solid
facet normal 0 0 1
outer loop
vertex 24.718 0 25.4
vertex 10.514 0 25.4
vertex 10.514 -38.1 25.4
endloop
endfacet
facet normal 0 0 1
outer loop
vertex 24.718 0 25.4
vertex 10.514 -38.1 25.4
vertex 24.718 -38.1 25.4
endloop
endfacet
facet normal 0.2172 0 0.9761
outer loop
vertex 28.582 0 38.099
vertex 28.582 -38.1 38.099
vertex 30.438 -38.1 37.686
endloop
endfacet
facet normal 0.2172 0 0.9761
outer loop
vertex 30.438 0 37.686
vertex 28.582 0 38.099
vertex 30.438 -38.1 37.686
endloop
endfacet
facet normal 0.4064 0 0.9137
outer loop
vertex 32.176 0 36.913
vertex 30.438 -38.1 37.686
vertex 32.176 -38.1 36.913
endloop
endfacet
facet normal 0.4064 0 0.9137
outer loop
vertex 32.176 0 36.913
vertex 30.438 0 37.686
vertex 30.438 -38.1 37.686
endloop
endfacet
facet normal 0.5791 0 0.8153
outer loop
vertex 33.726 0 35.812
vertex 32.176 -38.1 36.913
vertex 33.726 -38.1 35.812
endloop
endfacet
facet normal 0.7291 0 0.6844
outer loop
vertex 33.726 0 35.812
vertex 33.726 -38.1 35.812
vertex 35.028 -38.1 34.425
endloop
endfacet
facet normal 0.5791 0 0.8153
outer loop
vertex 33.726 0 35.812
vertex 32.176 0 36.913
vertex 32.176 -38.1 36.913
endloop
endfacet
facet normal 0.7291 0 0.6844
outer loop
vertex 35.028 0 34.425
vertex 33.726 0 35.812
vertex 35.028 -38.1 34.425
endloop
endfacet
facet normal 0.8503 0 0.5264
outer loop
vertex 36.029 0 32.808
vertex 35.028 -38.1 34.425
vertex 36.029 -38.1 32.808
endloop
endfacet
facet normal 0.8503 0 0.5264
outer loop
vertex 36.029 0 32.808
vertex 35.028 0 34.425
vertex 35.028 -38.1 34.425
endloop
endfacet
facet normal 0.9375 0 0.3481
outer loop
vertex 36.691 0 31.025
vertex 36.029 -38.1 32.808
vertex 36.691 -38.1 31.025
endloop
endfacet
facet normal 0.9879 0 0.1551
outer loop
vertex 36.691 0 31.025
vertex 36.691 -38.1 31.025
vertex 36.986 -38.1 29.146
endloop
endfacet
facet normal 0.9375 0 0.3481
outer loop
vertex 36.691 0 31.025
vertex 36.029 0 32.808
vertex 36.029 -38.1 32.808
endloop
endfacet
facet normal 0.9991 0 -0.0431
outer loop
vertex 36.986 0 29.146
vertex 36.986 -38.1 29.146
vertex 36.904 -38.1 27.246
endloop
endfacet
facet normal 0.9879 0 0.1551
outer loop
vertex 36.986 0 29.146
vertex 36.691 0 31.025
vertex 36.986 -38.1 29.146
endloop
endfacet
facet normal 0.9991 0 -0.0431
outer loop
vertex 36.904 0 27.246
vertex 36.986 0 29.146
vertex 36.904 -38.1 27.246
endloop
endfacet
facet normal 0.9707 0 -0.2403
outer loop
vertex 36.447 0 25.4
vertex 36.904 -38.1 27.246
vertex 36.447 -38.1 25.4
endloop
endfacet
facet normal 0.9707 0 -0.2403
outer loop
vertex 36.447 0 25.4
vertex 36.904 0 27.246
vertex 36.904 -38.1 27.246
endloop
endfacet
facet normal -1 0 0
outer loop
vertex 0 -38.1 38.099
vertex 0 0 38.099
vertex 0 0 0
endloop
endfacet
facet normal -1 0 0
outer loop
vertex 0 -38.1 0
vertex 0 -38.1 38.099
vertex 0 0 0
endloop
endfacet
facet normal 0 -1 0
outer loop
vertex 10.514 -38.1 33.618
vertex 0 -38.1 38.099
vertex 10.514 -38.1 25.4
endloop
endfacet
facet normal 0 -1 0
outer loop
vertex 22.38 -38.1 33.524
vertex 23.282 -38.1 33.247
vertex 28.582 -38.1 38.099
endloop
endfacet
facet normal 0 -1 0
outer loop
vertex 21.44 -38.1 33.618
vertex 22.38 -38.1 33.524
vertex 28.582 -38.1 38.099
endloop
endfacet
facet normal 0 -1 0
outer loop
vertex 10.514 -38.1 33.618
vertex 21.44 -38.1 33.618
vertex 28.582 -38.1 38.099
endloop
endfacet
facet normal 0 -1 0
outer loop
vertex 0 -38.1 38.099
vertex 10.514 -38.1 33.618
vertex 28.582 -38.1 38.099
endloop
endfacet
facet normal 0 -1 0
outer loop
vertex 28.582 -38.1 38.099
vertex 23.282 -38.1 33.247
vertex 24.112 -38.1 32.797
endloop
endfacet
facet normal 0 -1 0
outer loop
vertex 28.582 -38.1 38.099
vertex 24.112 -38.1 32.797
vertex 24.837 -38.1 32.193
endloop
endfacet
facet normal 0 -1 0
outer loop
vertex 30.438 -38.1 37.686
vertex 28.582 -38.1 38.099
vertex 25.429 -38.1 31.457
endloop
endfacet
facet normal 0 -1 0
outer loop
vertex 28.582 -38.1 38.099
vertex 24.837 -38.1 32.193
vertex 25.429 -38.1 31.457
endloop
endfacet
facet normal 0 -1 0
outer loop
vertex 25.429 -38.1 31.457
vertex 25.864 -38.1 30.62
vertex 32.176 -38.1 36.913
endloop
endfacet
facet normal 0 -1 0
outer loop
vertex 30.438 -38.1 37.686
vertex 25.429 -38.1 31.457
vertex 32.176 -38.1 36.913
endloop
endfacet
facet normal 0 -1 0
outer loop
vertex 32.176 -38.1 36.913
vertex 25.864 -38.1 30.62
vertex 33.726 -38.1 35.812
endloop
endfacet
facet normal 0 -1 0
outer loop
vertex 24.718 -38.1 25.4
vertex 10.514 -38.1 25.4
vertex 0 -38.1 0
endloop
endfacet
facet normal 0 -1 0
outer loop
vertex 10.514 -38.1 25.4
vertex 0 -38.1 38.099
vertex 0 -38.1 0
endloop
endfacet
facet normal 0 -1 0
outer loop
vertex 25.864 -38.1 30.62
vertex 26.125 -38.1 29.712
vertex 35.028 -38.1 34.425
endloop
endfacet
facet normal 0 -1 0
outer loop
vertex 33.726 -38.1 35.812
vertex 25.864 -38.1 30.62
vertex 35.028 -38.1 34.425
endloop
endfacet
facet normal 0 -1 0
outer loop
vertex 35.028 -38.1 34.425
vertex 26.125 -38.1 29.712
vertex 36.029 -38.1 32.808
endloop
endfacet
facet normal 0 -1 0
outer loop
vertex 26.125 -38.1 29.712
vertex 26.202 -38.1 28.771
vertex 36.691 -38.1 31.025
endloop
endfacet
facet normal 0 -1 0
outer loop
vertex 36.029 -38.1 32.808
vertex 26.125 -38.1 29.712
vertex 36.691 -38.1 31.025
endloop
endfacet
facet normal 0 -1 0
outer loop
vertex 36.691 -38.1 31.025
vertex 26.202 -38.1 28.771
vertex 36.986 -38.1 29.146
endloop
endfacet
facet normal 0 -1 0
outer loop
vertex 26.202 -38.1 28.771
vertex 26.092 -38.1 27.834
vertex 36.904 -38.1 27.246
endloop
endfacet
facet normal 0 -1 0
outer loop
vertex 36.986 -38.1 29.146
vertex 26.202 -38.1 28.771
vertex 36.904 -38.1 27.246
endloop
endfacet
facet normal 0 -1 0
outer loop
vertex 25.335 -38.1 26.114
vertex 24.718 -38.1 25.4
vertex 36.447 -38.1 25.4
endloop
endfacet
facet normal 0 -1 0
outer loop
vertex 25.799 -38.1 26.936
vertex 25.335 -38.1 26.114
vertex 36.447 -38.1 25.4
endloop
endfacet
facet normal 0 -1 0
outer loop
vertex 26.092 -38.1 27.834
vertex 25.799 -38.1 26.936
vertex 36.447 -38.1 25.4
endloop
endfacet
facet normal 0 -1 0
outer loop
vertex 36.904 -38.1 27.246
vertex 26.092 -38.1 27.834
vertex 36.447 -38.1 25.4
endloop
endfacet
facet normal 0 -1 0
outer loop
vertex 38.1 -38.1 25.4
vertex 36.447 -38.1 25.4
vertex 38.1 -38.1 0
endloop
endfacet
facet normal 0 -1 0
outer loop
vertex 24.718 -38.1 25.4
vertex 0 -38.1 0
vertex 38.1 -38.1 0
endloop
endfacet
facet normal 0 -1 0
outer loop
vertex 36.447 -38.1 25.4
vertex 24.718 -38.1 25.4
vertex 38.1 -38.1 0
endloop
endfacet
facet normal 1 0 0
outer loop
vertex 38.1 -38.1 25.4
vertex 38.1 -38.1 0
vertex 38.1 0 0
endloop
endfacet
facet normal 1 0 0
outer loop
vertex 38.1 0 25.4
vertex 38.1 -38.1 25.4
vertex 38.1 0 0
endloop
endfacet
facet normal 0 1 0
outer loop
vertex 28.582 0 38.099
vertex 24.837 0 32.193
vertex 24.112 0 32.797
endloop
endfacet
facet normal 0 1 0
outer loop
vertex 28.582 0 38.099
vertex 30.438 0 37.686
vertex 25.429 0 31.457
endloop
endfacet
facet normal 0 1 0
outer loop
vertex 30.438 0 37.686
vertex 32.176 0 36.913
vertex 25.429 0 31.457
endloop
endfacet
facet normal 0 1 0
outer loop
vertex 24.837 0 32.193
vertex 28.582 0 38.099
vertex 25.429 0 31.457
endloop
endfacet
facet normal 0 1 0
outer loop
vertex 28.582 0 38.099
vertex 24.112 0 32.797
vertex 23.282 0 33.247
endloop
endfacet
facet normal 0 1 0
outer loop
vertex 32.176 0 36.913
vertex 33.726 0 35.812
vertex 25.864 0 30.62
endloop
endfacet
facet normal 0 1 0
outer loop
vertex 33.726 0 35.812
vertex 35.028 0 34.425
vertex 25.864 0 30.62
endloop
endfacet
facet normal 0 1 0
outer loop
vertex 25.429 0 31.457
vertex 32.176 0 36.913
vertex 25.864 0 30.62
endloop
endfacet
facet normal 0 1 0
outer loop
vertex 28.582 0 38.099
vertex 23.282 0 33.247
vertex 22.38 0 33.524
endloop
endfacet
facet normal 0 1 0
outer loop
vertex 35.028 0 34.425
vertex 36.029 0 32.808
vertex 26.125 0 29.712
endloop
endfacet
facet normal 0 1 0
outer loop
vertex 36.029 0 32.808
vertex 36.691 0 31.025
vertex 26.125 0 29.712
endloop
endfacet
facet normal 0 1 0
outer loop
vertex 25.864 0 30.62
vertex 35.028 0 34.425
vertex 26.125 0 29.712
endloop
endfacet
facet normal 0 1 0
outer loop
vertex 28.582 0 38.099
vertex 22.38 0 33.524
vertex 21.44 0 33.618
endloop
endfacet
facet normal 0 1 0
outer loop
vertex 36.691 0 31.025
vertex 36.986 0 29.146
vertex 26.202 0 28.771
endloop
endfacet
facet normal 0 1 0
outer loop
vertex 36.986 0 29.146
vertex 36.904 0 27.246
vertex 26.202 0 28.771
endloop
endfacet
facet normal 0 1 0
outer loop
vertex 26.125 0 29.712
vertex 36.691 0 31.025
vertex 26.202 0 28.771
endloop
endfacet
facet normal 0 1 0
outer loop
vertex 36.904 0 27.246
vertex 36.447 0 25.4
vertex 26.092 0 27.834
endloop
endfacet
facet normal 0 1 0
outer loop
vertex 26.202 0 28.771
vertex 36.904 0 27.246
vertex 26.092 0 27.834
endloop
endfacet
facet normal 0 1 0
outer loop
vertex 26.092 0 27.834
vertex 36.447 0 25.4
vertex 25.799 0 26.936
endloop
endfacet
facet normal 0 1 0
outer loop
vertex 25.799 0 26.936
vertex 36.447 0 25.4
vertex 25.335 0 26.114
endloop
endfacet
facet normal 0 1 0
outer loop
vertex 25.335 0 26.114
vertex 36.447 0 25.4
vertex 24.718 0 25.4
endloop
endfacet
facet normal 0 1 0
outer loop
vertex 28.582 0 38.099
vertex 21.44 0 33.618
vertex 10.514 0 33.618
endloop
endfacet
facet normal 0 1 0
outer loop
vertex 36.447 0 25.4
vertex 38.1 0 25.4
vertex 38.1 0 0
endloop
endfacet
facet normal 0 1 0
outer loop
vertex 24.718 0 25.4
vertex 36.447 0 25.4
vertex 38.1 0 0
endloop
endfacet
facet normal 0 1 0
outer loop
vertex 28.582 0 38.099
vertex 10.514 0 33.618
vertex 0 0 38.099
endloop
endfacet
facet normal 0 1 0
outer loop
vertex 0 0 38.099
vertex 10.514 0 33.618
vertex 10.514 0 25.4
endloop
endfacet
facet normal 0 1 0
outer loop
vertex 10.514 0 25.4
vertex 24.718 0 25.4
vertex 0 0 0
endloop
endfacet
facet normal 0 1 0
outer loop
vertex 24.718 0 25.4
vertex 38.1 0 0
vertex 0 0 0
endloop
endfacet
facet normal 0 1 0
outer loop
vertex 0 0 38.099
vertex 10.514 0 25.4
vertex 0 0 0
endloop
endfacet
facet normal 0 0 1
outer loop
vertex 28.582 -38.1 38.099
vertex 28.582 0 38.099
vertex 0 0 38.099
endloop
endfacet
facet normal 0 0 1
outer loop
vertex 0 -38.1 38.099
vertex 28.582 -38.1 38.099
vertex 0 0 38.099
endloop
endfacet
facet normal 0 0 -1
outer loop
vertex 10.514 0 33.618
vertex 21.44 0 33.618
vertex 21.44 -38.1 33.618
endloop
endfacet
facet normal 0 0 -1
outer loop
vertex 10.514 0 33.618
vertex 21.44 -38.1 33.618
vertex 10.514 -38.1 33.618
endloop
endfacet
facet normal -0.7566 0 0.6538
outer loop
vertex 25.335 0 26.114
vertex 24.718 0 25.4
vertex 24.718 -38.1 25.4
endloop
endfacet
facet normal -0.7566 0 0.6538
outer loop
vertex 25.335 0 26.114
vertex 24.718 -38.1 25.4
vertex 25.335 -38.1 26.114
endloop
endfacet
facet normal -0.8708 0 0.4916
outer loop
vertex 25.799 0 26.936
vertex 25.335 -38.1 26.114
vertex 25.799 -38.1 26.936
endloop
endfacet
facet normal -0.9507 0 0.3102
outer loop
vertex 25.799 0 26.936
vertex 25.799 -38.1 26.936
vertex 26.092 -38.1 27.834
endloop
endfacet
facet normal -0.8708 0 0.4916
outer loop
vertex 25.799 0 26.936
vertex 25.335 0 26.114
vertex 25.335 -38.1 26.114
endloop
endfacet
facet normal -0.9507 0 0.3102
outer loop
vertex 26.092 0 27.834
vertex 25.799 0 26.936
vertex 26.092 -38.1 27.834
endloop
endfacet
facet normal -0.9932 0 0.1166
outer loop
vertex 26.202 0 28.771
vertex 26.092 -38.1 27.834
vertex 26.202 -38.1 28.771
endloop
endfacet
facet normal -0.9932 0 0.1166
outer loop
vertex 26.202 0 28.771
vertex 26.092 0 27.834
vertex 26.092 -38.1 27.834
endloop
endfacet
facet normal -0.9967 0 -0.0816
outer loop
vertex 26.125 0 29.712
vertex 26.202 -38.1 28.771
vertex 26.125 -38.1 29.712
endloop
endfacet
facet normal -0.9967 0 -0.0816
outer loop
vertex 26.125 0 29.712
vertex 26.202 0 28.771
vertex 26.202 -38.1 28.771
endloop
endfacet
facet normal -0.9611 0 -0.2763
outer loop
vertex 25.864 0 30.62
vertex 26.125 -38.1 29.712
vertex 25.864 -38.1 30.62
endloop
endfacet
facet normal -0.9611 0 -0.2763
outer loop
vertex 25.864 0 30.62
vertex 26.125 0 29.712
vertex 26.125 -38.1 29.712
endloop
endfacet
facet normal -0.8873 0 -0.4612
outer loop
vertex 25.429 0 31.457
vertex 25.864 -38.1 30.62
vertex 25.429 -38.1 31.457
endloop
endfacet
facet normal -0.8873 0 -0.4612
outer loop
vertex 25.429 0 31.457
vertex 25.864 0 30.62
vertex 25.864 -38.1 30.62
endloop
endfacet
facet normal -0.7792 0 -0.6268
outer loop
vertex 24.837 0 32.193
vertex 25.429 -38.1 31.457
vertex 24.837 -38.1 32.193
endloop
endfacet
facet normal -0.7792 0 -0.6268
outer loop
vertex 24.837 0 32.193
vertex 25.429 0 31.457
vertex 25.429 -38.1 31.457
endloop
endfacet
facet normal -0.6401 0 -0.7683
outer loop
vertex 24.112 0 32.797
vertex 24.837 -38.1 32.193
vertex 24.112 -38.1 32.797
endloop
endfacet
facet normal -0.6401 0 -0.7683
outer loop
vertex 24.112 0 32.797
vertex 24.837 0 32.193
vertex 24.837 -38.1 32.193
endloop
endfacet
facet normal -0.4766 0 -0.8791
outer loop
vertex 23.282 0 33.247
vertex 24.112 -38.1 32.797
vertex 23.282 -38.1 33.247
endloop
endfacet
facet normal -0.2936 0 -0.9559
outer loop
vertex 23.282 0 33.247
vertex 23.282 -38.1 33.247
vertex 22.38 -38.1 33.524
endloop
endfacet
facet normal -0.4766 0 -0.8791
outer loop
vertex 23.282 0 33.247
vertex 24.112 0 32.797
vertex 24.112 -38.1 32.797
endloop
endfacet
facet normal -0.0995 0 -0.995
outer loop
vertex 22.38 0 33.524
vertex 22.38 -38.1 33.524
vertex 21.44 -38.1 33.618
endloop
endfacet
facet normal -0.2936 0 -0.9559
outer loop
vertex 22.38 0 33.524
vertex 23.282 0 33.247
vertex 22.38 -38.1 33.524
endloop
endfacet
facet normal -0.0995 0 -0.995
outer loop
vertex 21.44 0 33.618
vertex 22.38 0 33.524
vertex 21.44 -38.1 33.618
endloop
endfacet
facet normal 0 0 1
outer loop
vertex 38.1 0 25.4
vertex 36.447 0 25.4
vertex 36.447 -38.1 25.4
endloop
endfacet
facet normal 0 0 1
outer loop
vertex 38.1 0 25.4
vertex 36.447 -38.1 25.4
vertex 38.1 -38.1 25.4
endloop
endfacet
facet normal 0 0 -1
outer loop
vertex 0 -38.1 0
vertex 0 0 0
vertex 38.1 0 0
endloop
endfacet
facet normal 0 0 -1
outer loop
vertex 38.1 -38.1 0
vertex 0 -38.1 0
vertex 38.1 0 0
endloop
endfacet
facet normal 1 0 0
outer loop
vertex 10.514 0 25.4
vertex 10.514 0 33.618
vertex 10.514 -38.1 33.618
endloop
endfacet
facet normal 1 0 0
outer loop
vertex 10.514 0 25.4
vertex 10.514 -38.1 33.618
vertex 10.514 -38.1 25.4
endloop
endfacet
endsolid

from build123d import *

# Parameters (mm, degrees)
F1_DEPTH = 38.1
F3_DEPTH = 38.1
F5_DEPTH = 25.4
F6_DEPTH = 25.4


with BuildPart() as f1:
    # F0 (on Front) → F1 (new body)
    with BuildSketch(Plane.XZ):
        Polygon((0, 38.099186), (0, 0), (37.85099, 0), (38.1, 38.099186), align=None)
    extrude(amount=F1_DEPTH)

    # F2 (on Front) → F3 (cut)
    with BuildSketch(Plane.XZ):
        with BuildLine():
            Line((10.514395, 33.617546), (10.514395, 24.092546))
            Line((10.514395, 24.092546), (21.440399, 24.092546))
            ThreePointArc((21.440399, 24.092546), (26.202899, 28.855046), (21.440399, 33.617546))
            Line((21.440399, 33.617546), (10.514395, 33.617546))
        make_face()
        with BuildLine():
            Line((10.513219, 14.010213), (10.513219, 4.485213))
            Line((10.513219, 4.485213), (21.435219, 4.485213))
            ThreePointArc((21.435219, 4.485213), (26.197719, 9.247713), (21.435219, 14.010213))
            Line((21.435219, 14.010213), (10.513219, 14.010213))
        make_face()
        with BuildLine():
            Line((38.1, 38.1), (28.575, 38.1))
            ThreePointArc((28.575, 38.1), (36.984506, 28.0415), (27.442695, 19.05))
            ThreePointArc((27.442695, 19.05), (36.984506, 10.0585), (28.575, 0))
            Line((28.575, 0), (38.1, 0))
            Line((38.1, 0), (38.1, 38.1))
        make_face()
    extrude(amount=F3_DEPTH, mode=Mode.SUBTRACT)

    # F4 (on Top) → F5 (join)
    with BuildSketch(Plane.XY):
        Polygon((38.1, 0), (0, 0), (0, -38.1), (38.1, -38.1), (38.1, -30.48), (7.62, -30.48), (7.62, -9.450001), (7.62, -7.62), (38.1, -7.62), align=None)
        Polygon((38.1, -30.48), (38.1, -7.62), (7.62, -7.62), (7.62, -9.450001), (7.62, -30.48), align=None)
    extrude(amount=F5_DEPTH)

    # F4 (on Top) → F6 (join)
    with BuildSketch(Plane.XY):
        Polygon((38.1, 0), (0, 0), (0, -38.1), (38.1, -38.1), (38.1, -30.48), (7.62, -30.48), (7.62, -9.450001), (7.62, -7.62), (38.1, -7.62), align=None)
        Polygon((38.1, -30.48), (38.1, -7.62), (7.62, -7.62), (7.62, -9.450001), (7.62, -30.48), align=None)
    extrude(amount=F6_DEPTH)


solid = f1.part
